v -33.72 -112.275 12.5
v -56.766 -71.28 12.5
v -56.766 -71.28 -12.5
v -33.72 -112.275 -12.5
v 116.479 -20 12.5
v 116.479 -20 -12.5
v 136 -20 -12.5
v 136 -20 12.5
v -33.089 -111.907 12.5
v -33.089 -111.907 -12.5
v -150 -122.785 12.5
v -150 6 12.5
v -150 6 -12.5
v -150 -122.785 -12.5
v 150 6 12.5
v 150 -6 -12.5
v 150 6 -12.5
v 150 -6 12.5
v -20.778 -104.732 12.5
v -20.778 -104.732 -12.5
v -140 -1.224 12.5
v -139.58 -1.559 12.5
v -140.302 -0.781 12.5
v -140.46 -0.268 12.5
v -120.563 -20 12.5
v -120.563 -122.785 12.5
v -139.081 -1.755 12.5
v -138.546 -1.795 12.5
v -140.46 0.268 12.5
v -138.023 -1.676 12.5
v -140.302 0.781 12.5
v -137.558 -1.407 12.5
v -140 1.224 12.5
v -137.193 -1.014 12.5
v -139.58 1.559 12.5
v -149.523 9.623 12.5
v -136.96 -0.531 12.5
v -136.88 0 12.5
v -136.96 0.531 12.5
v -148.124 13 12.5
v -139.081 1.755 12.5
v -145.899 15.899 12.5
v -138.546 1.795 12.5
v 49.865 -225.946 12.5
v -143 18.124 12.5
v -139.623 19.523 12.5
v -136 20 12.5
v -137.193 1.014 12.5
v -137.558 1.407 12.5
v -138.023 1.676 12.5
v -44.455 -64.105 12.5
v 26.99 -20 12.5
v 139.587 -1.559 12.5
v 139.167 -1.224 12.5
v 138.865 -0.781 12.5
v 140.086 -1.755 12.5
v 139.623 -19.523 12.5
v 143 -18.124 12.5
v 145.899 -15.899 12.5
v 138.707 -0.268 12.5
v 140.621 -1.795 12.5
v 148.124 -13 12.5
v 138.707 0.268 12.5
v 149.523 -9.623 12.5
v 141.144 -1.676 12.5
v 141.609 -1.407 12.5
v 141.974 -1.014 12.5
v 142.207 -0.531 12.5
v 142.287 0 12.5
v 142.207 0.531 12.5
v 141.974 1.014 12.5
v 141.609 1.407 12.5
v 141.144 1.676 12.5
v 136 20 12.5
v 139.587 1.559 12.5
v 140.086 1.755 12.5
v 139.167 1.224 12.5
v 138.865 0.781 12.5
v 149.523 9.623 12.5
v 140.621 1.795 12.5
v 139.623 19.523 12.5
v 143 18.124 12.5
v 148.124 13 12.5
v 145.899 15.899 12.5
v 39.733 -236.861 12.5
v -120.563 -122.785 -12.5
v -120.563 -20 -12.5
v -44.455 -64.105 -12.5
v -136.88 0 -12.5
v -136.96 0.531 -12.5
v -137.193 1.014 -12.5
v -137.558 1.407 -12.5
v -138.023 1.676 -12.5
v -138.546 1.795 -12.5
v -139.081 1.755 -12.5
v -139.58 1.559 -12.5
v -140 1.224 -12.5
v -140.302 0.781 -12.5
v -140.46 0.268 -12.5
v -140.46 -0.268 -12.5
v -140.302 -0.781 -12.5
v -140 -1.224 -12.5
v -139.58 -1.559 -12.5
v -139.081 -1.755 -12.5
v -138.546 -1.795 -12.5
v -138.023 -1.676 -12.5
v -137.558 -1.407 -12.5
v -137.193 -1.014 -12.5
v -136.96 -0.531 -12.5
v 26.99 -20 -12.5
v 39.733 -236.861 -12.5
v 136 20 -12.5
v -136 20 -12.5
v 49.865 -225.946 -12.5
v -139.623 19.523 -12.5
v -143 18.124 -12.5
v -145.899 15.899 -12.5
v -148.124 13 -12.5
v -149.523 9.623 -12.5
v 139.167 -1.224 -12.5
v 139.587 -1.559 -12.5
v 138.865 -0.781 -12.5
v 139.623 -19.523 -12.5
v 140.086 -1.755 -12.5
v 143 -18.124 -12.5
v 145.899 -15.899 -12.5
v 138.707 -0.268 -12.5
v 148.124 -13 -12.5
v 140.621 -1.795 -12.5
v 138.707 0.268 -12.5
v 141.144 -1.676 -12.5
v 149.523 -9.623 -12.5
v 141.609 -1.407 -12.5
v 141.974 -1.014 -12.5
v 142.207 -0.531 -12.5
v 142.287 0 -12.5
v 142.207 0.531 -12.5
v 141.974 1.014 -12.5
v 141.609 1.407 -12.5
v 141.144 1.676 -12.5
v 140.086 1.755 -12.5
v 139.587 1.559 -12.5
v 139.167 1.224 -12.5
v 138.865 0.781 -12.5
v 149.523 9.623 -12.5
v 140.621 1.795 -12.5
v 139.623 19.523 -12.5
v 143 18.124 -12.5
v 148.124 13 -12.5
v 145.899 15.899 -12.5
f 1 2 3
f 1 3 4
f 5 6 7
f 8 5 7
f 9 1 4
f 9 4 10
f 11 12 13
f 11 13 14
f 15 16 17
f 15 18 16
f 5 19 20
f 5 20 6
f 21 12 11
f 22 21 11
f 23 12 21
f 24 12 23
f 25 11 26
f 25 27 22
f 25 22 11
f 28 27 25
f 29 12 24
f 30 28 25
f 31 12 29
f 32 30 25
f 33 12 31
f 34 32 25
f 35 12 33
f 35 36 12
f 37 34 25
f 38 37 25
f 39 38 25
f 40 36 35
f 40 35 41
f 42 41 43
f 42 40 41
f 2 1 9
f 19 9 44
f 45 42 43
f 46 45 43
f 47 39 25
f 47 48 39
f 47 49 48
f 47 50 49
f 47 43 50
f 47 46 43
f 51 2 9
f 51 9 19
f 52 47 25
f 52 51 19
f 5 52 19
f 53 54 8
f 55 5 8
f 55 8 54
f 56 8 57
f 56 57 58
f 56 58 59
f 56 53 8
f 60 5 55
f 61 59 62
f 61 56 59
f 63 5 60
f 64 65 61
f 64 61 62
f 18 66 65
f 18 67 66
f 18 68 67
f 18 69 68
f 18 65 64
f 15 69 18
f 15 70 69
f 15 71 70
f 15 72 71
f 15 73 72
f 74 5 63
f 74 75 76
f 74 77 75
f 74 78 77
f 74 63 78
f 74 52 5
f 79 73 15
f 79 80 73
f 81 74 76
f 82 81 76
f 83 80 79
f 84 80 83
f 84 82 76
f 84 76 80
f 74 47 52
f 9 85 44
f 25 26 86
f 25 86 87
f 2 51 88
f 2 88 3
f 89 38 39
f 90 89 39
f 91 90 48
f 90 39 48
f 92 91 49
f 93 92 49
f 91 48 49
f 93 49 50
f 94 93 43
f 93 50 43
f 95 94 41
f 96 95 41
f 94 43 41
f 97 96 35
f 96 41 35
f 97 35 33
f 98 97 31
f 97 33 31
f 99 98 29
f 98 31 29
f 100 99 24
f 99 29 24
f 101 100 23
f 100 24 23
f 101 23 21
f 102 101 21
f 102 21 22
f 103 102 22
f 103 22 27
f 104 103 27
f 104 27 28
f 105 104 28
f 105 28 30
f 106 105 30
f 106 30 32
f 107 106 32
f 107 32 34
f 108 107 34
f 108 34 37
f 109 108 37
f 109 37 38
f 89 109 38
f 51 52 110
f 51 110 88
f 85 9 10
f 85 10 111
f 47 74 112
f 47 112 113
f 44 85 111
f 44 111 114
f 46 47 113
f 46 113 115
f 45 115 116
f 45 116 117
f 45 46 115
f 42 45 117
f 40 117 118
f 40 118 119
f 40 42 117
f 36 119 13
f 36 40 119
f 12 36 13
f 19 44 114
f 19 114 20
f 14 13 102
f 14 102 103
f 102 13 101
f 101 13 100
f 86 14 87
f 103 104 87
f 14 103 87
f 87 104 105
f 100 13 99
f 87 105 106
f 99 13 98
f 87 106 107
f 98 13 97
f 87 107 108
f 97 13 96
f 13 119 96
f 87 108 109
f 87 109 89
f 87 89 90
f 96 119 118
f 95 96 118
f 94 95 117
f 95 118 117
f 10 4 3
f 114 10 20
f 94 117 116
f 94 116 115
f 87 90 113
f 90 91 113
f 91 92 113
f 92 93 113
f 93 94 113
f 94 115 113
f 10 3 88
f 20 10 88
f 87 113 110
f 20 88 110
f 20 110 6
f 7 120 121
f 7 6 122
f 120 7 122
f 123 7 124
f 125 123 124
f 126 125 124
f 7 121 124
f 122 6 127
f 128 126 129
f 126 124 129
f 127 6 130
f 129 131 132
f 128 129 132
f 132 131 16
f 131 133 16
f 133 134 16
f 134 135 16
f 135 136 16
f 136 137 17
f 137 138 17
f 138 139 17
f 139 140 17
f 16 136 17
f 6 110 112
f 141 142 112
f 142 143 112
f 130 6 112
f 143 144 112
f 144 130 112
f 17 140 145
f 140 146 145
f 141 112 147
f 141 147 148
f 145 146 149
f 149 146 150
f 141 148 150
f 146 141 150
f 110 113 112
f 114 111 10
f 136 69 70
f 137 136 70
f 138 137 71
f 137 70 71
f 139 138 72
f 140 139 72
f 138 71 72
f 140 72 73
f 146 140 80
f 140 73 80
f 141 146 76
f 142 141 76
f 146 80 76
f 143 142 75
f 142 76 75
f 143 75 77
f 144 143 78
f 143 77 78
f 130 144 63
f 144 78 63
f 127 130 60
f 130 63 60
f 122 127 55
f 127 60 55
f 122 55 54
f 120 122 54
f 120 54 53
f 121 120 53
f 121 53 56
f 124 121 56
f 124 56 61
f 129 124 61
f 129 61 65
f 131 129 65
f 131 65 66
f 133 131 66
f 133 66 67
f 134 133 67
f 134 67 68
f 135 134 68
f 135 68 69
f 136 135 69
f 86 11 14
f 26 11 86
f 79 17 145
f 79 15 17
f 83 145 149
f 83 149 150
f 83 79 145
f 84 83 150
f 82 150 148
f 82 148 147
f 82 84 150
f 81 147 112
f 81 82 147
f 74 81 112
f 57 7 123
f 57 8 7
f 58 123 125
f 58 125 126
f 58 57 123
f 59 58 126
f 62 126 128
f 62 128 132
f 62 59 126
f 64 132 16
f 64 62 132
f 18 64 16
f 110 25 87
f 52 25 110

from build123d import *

# Parameters (mm, degrees)
F1_DEPTH = 12.5
F2_R     = 1.8
F3_DEPTH = 26
F4_R     = 1.8
F5_DEPTH = 26


with BuildPart() as f1:
    # F0 (on Top) → F1 (new body, symmetric)
    with BuildSketch(Plane.XY):
        with BuildLine():
            ThreePointArc((150, 6), (145.8994949366, 15.8994949366), (136, 20))
            Line((136, 20), (91.7857438326, 20))
            Line((91.7857438326, 20), (116.478802159, -20))
            Line((116.478802159, -20), (136, -20))
            ThreePointArc((136, -20), (145.8994949366, -15.8994949366), (150, -6))
            Line((150, -6), (150, 6))
        make_face()
        with BuildLine():
            Line((26.9902057972, -20), (91.7857438326, 20))
            Line((91.7857438326, 20), (-120.5630078912, 20))
            Line((-120.5630078912, 20), (-136, 20))
            ThreePointArc((-136, 20), (-145.8994949366, 15.8994949366), (-150, 6))
            Line((-150, 6), (-150, -6))
            Line((-150, -6), (-150, -122.7854788303))
            Line((-150, -122.7854788303), (-120.5630078912, -122.7854788303))
            Line((-120.5630078912, -122.7854788303), (-120.5630078912, -20))
            Line((-120.5630078912, -20), (26.9902057972, -20))
        make_face()
        Polygon((116.478802159, -20), (91.7857438326, 20), (26.9902057972, -20), align=None)
        Polygon((116.478802159, -20), (26.9902057972, -20), (-44.4547757506, -64.1048774123), (-20.7777143928, -104.7320792225), align=None)
        Polygon((-20.7777143928, -104.7320792225), (-44.4547757506, -64.1048774123), (-56.7659190817, -71.2796687602), (-33.0888577239, -111.9068705703), align=None)
        Polygon((49.8645024297, -225.9462601459), (-20.7777143928, -104.7320792225), (-33.0888577239, -111.9068705703), (39.7326772195, -236.8605188106), align=None)
        Polygon((-33.0888577239, -111.9068705703), (-56.7659190817, -71.2796687602), (-33.7199519959, -112.2746649823), align=None)
    extrude(amount=F1_DEPTH, both=True)

    # F2 (on face) → F3 (cut)
    with BuildSketch(Plane.XY.offset(12.5)):
        with Locations((-138.6803537607, 0)):
            Circle(F2_R)
    extrude(amount=-F3_DEPTH, mode=Mode.SUBTRACT)

    # F4 (on face) → F5 (cut)
    with BuildSketch(Plane.XY.offset(12.5)):
        with Locations((140.4866278172, 0)):
            Circle(F4_R)
    extrude(amount=-F5_DEPTH, mode=Mode.SUBTRACT)


solid = f1.part
